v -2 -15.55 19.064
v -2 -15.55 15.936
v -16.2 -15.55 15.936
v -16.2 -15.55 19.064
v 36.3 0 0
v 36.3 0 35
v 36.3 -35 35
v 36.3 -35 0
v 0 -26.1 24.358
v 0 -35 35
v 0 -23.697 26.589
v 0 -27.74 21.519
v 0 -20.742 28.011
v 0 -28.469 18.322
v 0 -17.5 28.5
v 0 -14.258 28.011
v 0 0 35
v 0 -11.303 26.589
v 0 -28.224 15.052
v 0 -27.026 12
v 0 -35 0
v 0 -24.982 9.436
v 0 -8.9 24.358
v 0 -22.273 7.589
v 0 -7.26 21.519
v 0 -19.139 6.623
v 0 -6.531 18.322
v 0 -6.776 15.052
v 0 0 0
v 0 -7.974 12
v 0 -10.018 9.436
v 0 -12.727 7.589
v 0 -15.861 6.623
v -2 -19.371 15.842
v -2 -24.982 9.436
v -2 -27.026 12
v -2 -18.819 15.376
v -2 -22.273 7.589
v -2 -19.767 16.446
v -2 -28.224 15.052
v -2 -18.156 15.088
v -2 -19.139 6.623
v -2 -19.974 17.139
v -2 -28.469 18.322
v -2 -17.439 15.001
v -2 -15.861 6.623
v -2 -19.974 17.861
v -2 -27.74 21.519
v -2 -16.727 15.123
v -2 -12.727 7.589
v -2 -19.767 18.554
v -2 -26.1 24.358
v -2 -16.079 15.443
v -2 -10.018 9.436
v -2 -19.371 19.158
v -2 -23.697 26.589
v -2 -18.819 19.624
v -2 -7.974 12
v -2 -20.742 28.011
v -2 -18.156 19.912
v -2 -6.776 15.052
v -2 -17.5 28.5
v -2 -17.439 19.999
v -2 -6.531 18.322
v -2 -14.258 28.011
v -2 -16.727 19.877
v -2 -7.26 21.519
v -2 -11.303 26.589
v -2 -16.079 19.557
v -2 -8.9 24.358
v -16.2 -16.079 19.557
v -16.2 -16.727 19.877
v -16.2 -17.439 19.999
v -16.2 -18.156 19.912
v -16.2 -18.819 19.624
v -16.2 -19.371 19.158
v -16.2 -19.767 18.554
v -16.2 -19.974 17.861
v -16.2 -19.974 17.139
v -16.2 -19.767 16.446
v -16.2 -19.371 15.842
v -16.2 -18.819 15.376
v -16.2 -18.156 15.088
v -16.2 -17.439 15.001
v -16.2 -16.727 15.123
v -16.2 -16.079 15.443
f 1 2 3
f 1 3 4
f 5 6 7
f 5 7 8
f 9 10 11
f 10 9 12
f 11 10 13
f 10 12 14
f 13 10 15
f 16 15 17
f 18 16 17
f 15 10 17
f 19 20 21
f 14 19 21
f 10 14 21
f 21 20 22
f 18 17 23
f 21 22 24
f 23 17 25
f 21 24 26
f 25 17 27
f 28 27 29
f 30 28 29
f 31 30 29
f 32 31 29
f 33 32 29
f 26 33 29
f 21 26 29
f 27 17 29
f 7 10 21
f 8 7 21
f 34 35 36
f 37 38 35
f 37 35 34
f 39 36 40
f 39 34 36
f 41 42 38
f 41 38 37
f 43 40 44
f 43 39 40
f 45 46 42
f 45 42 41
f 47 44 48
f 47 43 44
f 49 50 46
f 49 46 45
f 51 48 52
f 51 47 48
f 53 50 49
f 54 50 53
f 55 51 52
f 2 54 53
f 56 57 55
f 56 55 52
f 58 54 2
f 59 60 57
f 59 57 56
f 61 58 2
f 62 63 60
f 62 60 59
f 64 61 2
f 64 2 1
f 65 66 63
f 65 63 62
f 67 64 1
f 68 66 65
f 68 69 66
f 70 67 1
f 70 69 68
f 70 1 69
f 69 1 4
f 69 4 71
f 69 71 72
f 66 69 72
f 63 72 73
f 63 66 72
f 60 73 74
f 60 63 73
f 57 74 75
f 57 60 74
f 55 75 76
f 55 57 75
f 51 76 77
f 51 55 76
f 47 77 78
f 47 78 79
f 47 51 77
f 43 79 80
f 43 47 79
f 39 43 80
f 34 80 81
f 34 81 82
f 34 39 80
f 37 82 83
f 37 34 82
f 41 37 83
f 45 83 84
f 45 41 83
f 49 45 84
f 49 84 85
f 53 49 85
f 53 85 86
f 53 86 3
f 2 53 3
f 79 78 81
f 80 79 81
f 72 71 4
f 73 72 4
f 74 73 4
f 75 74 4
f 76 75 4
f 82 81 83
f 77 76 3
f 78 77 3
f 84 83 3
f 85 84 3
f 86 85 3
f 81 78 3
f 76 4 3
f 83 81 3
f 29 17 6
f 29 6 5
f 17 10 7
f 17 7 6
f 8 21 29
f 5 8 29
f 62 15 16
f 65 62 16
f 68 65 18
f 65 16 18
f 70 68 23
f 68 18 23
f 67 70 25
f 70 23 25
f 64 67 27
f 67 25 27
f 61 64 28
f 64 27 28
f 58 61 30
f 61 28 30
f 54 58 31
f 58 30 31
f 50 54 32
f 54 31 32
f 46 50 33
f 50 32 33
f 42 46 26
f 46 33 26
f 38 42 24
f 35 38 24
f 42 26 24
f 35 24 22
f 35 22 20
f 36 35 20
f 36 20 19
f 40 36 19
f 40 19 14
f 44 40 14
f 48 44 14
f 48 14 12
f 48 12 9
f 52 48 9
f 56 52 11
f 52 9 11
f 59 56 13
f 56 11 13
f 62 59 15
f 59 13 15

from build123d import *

# Parameters (mm, degrees)
SKETCH1_W           = 35
SKETCH1_H           = 35
BOSS_EXTRUDE1_DEPTH = 36.3
SKETCH2_R           = 11
BOSS_EXTRUDE2_DEPTH = 2
BOSS_EXTRUDE4_DEPTH = 14.2


with BuildPart() as part:
    # Sketch1 → Boss-Extrude1 (new body)
    with BuildSketch(Plane(origin=(0, 0, 0), x_dir=(0, 0, -1), z_dir=(1, 0, 0))):
        with Locations((-17.5, -17.5)):
            Rectangle(SKETCH1_W, SKETCH1_H)
    extrude(amount=BOSS_EXTRUDE1_DEPTH)

    # Sketch2 → Boss-Extrude2 (add)
    with BuildSketch(Plane.ZY):
        with Locations((17.5, -17.5)):
            Circle(SKETCH2_R)
    extrude(amount=BOSS_EXTRUDE2_DEPTH)

    # Sketch3 → Boss-Extrude4 (add)
    with BuildSketch(Plane.ZY.offset(2)):
        with BuildLine():
            Line((17.5, -15.55), (19.064448785, -15.55))
            ThreePointArc((19.064448785, -15.55), (17.5, -20), (15.935551215, -15.55))
            Line((15.935551215, -15.55), (17.5, -15.55))
        make_face()
    extrude(amount=BOSS_EXTRUDE4_DEPTH)


solid = part.part
